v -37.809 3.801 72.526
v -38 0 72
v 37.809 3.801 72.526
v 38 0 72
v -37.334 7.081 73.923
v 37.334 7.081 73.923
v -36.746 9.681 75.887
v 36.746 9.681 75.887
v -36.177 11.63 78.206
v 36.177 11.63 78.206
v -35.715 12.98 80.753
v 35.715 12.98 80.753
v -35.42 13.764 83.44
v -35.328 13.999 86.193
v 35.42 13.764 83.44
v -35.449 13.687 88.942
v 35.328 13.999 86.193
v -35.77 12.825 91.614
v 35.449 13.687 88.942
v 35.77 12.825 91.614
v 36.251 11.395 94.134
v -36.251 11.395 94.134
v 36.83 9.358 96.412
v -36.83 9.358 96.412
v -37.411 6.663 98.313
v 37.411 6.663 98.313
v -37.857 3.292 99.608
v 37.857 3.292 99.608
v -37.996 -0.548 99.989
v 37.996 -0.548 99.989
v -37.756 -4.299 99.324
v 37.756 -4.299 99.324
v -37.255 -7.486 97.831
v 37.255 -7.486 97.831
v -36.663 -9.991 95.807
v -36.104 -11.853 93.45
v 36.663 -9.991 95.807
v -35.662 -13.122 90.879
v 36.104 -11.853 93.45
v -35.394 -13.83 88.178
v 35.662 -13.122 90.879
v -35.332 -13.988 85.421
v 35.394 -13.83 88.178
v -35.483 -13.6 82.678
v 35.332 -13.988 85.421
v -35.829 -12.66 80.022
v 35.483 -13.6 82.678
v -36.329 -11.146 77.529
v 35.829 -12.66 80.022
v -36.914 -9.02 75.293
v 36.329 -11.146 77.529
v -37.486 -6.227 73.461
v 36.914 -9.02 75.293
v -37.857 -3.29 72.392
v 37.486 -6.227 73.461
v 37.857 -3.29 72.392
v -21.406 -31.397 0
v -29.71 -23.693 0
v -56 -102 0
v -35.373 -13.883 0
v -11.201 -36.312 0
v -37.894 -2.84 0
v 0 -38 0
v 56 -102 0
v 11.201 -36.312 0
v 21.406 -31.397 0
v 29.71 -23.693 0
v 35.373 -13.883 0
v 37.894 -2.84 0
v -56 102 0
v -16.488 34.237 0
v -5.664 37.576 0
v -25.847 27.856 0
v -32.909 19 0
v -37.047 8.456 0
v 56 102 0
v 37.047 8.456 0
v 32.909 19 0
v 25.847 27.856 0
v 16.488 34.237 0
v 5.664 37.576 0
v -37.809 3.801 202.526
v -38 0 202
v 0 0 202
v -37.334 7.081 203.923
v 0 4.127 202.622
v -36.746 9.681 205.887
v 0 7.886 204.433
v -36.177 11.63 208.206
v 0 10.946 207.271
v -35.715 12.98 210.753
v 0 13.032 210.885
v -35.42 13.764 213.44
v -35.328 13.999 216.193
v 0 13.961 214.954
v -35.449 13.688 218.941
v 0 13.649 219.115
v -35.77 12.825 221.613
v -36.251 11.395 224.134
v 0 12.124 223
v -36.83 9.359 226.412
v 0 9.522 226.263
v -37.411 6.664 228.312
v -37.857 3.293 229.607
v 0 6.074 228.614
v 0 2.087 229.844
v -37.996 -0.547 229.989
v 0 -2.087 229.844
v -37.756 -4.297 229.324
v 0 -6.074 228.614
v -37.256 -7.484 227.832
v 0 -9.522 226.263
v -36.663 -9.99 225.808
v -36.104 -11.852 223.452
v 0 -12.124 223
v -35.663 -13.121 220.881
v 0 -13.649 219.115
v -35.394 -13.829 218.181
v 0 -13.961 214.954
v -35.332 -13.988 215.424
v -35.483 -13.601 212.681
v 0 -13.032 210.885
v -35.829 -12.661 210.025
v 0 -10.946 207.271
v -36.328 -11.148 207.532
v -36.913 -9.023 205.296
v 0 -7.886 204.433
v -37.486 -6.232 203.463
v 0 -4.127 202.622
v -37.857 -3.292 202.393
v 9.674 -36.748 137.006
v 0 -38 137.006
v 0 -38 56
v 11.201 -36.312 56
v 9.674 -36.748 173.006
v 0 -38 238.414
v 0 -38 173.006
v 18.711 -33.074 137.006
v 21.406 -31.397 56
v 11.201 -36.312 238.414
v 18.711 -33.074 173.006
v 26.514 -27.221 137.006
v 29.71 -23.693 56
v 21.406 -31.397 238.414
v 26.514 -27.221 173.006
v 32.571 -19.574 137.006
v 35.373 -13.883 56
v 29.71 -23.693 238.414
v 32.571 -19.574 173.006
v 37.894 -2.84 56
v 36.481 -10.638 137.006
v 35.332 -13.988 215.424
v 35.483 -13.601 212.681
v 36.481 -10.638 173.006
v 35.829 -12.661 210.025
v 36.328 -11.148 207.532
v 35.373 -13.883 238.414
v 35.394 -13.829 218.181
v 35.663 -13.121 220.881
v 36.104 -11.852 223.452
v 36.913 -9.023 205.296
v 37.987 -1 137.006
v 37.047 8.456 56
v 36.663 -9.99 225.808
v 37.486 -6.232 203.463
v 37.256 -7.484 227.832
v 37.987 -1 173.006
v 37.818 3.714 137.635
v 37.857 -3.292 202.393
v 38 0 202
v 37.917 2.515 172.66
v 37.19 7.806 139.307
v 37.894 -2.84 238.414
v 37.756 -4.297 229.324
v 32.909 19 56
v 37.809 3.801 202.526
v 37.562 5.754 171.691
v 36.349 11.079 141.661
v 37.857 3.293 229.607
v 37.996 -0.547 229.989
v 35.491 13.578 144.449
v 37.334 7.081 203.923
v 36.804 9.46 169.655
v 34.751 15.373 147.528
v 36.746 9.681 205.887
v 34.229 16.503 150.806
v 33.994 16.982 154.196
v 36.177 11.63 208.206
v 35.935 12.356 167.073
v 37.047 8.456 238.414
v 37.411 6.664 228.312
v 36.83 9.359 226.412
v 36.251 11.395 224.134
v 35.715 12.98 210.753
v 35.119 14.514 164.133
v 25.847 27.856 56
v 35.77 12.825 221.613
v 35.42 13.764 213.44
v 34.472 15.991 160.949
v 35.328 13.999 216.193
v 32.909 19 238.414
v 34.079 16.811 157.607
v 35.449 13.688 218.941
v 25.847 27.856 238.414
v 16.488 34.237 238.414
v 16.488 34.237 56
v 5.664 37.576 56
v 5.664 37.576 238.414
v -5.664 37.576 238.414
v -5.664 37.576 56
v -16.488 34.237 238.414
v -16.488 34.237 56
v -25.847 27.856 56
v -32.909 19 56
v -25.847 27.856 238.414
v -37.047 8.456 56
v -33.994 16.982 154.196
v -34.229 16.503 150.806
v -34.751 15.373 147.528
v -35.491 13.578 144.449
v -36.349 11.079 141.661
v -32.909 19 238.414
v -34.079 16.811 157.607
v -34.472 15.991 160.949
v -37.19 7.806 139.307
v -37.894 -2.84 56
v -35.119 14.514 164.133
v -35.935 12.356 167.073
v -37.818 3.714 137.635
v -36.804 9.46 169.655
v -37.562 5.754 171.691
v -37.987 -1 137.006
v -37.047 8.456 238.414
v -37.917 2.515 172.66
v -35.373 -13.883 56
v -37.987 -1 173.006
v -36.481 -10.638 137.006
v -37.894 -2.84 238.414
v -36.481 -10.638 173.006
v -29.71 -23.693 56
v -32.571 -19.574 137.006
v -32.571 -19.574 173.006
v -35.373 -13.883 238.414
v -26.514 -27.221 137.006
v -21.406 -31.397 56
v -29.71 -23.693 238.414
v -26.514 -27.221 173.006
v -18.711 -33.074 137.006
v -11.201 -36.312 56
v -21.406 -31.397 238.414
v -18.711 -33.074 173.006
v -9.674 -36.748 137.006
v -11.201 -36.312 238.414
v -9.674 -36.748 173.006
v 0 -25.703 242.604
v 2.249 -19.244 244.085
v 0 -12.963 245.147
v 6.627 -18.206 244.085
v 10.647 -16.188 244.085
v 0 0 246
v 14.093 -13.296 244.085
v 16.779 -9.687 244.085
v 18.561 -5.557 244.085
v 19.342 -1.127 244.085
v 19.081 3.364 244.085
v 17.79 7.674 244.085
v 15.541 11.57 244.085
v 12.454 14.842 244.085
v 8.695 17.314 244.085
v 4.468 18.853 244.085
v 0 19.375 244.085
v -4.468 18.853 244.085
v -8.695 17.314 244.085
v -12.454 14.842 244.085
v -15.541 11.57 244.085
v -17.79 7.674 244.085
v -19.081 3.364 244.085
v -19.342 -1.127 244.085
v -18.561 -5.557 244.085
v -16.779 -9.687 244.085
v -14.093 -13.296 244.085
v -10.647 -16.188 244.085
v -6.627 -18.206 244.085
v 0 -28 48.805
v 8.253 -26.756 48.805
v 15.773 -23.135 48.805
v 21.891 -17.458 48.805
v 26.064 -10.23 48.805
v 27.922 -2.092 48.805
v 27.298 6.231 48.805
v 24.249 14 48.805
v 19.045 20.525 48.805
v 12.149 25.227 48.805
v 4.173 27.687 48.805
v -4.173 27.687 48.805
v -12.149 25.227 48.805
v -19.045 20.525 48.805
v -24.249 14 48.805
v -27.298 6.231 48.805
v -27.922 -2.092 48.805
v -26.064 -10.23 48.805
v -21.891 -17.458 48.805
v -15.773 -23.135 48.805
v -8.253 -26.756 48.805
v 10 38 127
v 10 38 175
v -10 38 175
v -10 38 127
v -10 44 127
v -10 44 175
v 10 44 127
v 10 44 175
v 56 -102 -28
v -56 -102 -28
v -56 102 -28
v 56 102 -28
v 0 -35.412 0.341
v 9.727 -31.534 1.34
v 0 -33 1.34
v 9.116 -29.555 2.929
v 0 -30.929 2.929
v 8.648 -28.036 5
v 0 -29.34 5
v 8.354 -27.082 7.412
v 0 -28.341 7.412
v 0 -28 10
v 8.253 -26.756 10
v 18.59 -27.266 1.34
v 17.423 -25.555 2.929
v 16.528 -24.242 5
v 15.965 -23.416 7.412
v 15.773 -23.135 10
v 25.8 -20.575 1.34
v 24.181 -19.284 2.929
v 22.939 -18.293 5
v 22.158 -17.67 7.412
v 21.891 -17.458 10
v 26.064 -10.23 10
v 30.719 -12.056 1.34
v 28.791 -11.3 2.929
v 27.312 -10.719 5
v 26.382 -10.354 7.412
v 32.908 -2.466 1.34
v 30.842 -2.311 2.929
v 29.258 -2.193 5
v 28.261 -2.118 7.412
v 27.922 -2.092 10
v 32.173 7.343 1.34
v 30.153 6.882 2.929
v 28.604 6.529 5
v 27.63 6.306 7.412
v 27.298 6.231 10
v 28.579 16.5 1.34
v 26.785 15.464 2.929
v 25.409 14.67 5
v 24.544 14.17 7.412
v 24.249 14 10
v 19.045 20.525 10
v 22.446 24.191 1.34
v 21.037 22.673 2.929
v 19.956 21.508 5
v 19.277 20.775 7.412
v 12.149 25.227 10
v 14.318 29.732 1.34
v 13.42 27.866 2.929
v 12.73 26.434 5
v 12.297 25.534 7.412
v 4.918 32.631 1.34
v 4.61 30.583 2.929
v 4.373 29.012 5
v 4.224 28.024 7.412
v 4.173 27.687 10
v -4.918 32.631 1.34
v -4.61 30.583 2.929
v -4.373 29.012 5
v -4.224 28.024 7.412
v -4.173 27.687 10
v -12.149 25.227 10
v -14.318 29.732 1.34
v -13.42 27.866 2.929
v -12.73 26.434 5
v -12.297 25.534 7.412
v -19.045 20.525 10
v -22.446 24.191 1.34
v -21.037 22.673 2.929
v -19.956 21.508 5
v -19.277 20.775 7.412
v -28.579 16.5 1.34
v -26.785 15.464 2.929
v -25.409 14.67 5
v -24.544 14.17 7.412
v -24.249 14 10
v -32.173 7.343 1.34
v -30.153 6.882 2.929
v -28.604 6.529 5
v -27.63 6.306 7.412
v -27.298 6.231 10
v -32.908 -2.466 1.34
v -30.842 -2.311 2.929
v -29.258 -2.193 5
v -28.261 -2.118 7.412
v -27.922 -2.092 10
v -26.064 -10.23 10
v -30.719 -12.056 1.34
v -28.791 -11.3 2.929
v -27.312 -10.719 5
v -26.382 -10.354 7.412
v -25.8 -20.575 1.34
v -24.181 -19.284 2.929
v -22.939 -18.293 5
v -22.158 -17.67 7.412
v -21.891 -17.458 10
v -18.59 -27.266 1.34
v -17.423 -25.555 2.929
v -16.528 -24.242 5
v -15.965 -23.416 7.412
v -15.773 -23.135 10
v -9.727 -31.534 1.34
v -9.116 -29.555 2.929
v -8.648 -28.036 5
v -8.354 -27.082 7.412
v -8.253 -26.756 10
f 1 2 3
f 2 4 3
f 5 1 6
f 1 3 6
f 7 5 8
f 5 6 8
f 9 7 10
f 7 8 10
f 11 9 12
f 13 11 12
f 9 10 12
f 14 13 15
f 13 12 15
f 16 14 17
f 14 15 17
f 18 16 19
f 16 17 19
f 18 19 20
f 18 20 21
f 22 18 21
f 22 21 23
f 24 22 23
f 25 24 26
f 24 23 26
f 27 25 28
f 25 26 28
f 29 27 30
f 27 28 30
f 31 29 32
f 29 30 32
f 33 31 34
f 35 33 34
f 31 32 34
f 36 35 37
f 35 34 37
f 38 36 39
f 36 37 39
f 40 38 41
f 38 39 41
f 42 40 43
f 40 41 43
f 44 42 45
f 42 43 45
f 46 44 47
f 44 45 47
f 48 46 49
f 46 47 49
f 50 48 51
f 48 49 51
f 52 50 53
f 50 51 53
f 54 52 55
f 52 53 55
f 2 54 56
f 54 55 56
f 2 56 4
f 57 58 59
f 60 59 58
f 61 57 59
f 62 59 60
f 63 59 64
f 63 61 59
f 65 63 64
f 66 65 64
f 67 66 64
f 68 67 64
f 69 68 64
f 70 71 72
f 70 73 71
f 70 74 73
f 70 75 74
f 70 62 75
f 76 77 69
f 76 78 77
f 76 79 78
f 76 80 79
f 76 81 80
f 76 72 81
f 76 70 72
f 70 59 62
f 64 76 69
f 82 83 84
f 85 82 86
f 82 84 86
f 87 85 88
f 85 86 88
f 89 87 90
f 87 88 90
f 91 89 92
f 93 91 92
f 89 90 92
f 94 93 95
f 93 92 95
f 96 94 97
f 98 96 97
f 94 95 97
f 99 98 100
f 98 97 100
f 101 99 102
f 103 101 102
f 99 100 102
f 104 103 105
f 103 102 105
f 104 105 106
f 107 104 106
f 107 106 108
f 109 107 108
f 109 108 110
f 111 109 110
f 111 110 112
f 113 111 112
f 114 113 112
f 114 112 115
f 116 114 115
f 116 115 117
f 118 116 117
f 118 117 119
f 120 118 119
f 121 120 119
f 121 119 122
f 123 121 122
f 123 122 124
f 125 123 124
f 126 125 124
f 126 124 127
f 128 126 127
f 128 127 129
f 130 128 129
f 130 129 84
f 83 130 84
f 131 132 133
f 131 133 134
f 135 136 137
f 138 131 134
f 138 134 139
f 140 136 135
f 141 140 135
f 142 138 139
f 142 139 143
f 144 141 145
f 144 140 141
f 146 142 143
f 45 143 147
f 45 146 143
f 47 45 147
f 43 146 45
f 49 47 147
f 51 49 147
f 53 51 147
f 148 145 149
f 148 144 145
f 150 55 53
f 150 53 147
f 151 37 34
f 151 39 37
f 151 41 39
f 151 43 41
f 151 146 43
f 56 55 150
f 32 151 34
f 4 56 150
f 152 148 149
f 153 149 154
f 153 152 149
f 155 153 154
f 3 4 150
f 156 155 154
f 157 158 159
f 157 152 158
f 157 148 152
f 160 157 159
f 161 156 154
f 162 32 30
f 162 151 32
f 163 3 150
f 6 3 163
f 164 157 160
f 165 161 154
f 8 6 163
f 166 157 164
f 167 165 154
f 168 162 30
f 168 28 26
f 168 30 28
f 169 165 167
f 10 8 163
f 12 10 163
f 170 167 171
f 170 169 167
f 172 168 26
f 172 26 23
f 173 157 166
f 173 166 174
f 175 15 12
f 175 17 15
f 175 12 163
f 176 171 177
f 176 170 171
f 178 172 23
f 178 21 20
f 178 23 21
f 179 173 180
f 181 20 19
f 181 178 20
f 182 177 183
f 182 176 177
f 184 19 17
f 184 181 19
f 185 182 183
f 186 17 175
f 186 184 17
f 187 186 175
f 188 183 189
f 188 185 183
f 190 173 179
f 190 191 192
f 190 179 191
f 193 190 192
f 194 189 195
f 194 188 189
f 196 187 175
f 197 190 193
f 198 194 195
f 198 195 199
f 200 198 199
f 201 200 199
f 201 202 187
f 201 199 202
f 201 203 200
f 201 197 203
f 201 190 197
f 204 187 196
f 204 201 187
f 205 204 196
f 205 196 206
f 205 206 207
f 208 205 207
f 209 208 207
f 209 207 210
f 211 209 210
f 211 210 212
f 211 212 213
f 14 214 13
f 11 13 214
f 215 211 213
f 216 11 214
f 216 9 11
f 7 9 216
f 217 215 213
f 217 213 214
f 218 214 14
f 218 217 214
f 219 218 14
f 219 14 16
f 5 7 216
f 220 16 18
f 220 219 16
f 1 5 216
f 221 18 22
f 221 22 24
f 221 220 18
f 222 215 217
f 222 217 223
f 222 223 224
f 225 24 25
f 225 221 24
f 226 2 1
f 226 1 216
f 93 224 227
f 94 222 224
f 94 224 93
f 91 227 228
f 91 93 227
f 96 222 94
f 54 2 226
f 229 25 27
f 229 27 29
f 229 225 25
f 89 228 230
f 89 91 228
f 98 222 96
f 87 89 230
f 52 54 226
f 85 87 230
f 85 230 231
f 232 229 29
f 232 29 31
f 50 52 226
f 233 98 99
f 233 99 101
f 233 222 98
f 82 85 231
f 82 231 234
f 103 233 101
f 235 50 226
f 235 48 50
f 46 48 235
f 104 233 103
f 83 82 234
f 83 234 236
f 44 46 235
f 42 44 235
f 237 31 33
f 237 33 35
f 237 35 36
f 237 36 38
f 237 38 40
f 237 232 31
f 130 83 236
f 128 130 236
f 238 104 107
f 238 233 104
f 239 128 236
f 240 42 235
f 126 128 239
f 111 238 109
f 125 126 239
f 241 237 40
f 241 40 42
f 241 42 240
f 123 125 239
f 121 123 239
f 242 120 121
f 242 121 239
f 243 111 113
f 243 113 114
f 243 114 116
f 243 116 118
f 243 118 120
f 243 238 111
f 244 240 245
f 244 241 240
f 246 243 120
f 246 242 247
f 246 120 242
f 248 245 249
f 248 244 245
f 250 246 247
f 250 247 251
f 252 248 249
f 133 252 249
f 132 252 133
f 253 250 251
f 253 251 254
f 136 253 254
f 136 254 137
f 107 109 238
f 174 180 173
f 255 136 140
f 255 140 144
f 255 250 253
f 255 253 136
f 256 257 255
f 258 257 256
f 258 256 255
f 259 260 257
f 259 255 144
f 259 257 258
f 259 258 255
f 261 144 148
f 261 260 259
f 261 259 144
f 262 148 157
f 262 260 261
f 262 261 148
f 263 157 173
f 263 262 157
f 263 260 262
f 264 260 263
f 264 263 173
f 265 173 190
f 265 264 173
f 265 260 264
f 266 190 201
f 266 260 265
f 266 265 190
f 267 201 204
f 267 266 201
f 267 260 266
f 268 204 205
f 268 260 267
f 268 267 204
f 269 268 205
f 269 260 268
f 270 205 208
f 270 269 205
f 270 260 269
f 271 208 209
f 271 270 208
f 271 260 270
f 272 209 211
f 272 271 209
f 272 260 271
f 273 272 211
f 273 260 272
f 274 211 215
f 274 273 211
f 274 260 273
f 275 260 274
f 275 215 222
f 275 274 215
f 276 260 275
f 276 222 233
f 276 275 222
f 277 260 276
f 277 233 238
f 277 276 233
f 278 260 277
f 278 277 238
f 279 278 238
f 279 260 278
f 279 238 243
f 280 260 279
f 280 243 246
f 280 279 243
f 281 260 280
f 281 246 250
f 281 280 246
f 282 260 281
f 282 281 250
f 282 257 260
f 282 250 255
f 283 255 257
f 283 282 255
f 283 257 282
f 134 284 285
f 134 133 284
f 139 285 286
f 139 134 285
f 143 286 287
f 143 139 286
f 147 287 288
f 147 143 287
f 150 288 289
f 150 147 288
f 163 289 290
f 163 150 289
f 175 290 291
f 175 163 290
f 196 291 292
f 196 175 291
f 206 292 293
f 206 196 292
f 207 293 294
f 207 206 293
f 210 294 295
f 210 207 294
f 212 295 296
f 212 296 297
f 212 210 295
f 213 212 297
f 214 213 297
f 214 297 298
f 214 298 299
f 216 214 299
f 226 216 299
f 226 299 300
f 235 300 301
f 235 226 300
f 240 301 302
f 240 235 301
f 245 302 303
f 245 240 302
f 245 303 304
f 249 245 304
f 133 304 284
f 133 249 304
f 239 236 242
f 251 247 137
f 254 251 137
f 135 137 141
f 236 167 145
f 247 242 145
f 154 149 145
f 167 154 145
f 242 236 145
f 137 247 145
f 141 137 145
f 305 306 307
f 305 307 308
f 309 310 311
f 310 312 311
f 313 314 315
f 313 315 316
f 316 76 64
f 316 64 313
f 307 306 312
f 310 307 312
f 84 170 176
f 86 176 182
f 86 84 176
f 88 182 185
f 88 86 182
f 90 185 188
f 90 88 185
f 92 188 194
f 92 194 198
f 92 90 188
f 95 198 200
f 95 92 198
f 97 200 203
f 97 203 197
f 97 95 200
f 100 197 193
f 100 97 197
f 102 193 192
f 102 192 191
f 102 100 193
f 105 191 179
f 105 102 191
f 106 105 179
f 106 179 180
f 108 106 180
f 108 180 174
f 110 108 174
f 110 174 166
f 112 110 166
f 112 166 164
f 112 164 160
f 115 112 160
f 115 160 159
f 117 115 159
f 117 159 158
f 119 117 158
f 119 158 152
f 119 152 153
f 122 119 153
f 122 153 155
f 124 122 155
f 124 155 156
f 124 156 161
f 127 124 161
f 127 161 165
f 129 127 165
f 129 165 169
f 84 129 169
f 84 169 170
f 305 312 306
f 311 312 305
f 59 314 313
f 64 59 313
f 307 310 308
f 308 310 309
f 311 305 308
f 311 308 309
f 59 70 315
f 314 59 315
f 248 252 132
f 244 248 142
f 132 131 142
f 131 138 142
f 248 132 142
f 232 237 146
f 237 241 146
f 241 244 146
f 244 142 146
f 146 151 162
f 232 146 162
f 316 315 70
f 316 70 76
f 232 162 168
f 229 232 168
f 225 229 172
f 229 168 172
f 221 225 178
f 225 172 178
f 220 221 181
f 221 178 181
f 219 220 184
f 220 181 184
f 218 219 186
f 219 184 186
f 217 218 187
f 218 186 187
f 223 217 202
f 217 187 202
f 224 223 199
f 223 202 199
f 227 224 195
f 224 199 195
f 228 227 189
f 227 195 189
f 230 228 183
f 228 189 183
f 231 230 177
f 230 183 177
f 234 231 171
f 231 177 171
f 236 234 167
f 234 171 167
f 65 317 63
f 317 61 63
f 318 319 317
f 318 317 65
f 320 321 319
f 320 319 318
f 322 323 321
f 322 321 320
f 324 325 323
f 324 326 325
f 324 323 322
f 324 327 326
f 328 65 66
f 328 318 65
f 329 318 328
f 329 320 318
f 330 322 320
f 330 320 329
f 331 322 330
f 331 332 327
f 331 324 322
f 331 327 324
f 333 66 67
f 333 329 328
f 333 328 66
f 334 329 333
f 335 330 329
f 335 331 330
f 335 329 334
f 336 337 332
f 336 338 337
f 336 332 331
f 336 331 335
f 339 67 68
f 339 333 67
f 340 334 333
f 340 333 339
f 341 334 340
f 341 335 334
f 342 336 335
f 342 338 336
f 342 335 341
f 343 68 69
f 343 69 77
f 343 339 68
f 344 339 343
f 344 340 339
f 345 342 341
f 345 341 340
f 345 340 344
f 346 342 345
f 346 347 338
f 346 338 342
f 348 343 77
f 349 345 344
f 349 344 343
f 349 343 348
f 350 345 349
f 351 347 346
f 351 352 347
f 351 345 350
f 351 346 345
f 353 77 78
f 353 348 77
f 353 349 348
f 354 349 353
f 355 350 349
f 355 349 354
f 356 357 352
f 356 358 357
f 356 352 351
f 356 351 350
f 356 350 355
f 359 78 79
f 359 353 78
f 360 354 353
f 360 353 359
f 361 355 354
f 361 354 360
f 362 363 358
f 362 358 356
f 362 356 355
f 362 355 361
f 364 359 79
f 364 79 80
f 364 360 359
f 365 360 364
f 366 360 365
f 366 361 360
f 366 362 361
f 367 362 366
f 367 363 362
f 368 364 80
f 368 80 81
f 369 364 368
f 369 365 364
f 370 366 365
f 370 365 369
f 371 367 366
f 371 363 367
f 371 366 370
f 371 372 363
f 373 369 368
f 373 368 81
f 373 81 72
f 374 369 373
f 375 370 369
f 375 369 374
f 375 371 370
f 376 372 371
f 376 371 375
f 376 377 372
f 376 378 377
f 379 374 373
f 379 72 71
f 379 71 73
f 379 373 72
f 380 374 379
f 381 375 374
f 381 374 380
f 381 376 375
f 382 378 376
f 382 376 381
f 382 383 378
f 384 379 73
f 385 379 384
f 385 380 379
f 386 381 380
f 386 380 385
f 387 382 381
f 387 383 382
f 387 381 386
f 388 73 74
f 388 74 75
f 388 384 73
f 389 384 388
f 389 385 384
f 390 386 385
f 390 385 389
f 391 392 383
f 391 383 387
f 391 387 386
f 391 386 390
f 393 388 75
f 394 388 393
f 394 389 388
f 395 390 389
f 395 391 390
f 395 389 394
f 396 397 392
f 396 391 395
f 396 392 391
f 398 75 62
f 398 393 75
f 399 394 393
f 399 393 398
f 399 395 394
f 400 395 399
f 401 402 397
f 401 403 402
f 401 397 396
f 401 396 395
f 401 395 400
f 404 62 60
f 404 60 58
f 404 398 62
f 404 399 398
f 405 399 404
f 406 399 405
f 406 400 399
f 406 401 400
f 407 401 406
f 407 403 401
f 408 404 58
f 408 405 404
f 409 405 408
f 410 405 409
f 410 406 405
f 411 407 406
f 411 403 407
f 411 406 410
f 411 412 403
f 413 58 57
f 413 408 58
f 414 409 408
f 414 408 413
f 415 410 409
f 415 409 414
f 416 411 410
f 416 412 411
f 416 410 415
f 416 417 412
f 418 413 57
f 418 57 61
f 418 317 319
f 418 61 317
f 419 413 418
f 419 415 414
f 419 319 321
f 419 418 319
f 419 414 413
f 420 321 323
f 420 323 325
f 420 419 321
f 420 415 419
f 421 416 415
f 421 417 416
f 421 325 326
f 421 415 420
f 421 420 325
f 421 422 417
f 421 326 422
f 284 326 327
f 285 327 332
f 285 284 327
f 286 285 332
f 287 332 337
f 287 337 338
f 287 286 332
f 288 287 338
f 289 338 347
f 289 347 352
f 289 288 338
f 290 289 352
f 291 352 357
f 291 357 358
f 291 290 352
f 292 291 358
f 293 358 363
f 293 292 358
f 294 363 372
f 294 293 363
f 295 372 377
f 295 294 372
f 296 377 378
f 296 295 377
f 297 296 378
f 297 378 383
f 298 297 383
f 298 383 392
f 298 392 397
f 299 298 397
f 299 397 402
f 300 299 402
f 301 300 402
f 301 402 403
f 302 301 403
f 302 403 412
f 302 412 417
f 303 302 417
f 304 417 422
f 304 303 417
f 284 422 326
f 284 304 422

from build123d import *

# Parameters (mm, degrees)
SKETCH2_W           = 112
SKETCH2_H           = 28
BOSS_EXTRUDE1_DEPTH = 102
SKETCH7_R           = 14
CUT_EXTRUDE1_DEPTH  = 102
SKETCH8_W           = 48
SKETCH8_H           = 6
BOSS_EXTRUDE3_DEPTH = 10
CUT_EXTRUDE2_DEPTH  = 62
FILLET5_R           = 10


with BuildPart() as part:
    # Sketch2 → Boss-Extrude1 (new body, symmetric)
    with BuildSketch(Plane(origin=(0, 0, 0), x_dir=(1, 0, 0), z_dir=(0, 1, 0))):
        with Locations((0, 14)):
            Rectangle(SKETCH2_W, SKETCH2_H)
    extrude(amount=BOSS_EXTRUDE1_DEPTH, both=True)

    # Sketch6 → Revolve2 (revolve)
    with BuildSketch(Plane(origin=(0, 0, 0), x_dir=(0, 0, -1), z_dir=(1, 0, 0))):
        with BuildLine():
            Line((0, -28), (-48.804519097, -28))
            Line((-48.804519097, -28), (-56, -38))
            Line((-56, -38), (-238.413768212, -38))
            ThreePointArc((-238.413768212, -38), (-244.084912572, -19.374925243), (-246, 0))
            Line((-246, 0), (-147.034469102, 0))
            Line((-147.034469102, 0), (0, 0))
            Line((0, 0), (0, -28))
        make_face()
    revolve(axis=Axis((0, 0, 0), (0, 0, 1)))

    # Sketch7 → Cut-Extrude1 (cut, symmetric)
    with BuildSketch(Plane(origin=(0, 0, 0), x_dir=(0, 0, -1), z_dir=(1, 0, 0))):
        with Locations((-216, 0)):
            Circle(SKETCH7_R)
        with Locations((-86, 0)):
            Circle(SKETCH7_R)
    extrude(amount=CUT_EXTRUDE1_DEPTH, both=True, mode=Mode.SUBTRACT)

    # Sketch11 → Cut-Extrude2 (cut, symmetric)
    with BuildSketch(Plane(origin=(0, 0, 0), x_dir=(0, 0, -1), z_dir=(1, 0, 0))):
        with BuildLine():
            Line((-173.006418676, -1), (-173.006418676, -59.703789586))
            Line((-173.006418676, -59.703789586), (-137.006418676, -59.703789586))
            Line((-137.006418676, -59.703789586), (-137.006418676, -1))
            ThreePointArc((-137.006418676, -1), (-155.006418676, 17), (-173.006418676, -1))
        make_face()
    extrude(amount=CUT_EXTRUDE2_DEPTH, both=True, mode=Mode.SUBTRACT)

    # Fillet5
    fillet5_edges = [part.edges().sort_by_distance(p)[0] for p in [
        (0, 28, 0),
    ]]
    fillet(fillet5_edges, radius=FILLET5_R)


with BuildPart() as body_2:
    # Sketch8 → Boss-Extrude3 (new body, symmetric)
    with BuildSketch(Plane(origin=(0, 0, 0), x_dir=(0, 0, -1), z_dir=(1, 0, 0))):
        with Locations((-151, 41)):
            Rectangle(SKETCH8_W, SKETCH8_H)
    extrude(amount=BOSS_EXTRUDE3_DEPTH, both=True)


solid = Compound([part.part, body_2.part])
